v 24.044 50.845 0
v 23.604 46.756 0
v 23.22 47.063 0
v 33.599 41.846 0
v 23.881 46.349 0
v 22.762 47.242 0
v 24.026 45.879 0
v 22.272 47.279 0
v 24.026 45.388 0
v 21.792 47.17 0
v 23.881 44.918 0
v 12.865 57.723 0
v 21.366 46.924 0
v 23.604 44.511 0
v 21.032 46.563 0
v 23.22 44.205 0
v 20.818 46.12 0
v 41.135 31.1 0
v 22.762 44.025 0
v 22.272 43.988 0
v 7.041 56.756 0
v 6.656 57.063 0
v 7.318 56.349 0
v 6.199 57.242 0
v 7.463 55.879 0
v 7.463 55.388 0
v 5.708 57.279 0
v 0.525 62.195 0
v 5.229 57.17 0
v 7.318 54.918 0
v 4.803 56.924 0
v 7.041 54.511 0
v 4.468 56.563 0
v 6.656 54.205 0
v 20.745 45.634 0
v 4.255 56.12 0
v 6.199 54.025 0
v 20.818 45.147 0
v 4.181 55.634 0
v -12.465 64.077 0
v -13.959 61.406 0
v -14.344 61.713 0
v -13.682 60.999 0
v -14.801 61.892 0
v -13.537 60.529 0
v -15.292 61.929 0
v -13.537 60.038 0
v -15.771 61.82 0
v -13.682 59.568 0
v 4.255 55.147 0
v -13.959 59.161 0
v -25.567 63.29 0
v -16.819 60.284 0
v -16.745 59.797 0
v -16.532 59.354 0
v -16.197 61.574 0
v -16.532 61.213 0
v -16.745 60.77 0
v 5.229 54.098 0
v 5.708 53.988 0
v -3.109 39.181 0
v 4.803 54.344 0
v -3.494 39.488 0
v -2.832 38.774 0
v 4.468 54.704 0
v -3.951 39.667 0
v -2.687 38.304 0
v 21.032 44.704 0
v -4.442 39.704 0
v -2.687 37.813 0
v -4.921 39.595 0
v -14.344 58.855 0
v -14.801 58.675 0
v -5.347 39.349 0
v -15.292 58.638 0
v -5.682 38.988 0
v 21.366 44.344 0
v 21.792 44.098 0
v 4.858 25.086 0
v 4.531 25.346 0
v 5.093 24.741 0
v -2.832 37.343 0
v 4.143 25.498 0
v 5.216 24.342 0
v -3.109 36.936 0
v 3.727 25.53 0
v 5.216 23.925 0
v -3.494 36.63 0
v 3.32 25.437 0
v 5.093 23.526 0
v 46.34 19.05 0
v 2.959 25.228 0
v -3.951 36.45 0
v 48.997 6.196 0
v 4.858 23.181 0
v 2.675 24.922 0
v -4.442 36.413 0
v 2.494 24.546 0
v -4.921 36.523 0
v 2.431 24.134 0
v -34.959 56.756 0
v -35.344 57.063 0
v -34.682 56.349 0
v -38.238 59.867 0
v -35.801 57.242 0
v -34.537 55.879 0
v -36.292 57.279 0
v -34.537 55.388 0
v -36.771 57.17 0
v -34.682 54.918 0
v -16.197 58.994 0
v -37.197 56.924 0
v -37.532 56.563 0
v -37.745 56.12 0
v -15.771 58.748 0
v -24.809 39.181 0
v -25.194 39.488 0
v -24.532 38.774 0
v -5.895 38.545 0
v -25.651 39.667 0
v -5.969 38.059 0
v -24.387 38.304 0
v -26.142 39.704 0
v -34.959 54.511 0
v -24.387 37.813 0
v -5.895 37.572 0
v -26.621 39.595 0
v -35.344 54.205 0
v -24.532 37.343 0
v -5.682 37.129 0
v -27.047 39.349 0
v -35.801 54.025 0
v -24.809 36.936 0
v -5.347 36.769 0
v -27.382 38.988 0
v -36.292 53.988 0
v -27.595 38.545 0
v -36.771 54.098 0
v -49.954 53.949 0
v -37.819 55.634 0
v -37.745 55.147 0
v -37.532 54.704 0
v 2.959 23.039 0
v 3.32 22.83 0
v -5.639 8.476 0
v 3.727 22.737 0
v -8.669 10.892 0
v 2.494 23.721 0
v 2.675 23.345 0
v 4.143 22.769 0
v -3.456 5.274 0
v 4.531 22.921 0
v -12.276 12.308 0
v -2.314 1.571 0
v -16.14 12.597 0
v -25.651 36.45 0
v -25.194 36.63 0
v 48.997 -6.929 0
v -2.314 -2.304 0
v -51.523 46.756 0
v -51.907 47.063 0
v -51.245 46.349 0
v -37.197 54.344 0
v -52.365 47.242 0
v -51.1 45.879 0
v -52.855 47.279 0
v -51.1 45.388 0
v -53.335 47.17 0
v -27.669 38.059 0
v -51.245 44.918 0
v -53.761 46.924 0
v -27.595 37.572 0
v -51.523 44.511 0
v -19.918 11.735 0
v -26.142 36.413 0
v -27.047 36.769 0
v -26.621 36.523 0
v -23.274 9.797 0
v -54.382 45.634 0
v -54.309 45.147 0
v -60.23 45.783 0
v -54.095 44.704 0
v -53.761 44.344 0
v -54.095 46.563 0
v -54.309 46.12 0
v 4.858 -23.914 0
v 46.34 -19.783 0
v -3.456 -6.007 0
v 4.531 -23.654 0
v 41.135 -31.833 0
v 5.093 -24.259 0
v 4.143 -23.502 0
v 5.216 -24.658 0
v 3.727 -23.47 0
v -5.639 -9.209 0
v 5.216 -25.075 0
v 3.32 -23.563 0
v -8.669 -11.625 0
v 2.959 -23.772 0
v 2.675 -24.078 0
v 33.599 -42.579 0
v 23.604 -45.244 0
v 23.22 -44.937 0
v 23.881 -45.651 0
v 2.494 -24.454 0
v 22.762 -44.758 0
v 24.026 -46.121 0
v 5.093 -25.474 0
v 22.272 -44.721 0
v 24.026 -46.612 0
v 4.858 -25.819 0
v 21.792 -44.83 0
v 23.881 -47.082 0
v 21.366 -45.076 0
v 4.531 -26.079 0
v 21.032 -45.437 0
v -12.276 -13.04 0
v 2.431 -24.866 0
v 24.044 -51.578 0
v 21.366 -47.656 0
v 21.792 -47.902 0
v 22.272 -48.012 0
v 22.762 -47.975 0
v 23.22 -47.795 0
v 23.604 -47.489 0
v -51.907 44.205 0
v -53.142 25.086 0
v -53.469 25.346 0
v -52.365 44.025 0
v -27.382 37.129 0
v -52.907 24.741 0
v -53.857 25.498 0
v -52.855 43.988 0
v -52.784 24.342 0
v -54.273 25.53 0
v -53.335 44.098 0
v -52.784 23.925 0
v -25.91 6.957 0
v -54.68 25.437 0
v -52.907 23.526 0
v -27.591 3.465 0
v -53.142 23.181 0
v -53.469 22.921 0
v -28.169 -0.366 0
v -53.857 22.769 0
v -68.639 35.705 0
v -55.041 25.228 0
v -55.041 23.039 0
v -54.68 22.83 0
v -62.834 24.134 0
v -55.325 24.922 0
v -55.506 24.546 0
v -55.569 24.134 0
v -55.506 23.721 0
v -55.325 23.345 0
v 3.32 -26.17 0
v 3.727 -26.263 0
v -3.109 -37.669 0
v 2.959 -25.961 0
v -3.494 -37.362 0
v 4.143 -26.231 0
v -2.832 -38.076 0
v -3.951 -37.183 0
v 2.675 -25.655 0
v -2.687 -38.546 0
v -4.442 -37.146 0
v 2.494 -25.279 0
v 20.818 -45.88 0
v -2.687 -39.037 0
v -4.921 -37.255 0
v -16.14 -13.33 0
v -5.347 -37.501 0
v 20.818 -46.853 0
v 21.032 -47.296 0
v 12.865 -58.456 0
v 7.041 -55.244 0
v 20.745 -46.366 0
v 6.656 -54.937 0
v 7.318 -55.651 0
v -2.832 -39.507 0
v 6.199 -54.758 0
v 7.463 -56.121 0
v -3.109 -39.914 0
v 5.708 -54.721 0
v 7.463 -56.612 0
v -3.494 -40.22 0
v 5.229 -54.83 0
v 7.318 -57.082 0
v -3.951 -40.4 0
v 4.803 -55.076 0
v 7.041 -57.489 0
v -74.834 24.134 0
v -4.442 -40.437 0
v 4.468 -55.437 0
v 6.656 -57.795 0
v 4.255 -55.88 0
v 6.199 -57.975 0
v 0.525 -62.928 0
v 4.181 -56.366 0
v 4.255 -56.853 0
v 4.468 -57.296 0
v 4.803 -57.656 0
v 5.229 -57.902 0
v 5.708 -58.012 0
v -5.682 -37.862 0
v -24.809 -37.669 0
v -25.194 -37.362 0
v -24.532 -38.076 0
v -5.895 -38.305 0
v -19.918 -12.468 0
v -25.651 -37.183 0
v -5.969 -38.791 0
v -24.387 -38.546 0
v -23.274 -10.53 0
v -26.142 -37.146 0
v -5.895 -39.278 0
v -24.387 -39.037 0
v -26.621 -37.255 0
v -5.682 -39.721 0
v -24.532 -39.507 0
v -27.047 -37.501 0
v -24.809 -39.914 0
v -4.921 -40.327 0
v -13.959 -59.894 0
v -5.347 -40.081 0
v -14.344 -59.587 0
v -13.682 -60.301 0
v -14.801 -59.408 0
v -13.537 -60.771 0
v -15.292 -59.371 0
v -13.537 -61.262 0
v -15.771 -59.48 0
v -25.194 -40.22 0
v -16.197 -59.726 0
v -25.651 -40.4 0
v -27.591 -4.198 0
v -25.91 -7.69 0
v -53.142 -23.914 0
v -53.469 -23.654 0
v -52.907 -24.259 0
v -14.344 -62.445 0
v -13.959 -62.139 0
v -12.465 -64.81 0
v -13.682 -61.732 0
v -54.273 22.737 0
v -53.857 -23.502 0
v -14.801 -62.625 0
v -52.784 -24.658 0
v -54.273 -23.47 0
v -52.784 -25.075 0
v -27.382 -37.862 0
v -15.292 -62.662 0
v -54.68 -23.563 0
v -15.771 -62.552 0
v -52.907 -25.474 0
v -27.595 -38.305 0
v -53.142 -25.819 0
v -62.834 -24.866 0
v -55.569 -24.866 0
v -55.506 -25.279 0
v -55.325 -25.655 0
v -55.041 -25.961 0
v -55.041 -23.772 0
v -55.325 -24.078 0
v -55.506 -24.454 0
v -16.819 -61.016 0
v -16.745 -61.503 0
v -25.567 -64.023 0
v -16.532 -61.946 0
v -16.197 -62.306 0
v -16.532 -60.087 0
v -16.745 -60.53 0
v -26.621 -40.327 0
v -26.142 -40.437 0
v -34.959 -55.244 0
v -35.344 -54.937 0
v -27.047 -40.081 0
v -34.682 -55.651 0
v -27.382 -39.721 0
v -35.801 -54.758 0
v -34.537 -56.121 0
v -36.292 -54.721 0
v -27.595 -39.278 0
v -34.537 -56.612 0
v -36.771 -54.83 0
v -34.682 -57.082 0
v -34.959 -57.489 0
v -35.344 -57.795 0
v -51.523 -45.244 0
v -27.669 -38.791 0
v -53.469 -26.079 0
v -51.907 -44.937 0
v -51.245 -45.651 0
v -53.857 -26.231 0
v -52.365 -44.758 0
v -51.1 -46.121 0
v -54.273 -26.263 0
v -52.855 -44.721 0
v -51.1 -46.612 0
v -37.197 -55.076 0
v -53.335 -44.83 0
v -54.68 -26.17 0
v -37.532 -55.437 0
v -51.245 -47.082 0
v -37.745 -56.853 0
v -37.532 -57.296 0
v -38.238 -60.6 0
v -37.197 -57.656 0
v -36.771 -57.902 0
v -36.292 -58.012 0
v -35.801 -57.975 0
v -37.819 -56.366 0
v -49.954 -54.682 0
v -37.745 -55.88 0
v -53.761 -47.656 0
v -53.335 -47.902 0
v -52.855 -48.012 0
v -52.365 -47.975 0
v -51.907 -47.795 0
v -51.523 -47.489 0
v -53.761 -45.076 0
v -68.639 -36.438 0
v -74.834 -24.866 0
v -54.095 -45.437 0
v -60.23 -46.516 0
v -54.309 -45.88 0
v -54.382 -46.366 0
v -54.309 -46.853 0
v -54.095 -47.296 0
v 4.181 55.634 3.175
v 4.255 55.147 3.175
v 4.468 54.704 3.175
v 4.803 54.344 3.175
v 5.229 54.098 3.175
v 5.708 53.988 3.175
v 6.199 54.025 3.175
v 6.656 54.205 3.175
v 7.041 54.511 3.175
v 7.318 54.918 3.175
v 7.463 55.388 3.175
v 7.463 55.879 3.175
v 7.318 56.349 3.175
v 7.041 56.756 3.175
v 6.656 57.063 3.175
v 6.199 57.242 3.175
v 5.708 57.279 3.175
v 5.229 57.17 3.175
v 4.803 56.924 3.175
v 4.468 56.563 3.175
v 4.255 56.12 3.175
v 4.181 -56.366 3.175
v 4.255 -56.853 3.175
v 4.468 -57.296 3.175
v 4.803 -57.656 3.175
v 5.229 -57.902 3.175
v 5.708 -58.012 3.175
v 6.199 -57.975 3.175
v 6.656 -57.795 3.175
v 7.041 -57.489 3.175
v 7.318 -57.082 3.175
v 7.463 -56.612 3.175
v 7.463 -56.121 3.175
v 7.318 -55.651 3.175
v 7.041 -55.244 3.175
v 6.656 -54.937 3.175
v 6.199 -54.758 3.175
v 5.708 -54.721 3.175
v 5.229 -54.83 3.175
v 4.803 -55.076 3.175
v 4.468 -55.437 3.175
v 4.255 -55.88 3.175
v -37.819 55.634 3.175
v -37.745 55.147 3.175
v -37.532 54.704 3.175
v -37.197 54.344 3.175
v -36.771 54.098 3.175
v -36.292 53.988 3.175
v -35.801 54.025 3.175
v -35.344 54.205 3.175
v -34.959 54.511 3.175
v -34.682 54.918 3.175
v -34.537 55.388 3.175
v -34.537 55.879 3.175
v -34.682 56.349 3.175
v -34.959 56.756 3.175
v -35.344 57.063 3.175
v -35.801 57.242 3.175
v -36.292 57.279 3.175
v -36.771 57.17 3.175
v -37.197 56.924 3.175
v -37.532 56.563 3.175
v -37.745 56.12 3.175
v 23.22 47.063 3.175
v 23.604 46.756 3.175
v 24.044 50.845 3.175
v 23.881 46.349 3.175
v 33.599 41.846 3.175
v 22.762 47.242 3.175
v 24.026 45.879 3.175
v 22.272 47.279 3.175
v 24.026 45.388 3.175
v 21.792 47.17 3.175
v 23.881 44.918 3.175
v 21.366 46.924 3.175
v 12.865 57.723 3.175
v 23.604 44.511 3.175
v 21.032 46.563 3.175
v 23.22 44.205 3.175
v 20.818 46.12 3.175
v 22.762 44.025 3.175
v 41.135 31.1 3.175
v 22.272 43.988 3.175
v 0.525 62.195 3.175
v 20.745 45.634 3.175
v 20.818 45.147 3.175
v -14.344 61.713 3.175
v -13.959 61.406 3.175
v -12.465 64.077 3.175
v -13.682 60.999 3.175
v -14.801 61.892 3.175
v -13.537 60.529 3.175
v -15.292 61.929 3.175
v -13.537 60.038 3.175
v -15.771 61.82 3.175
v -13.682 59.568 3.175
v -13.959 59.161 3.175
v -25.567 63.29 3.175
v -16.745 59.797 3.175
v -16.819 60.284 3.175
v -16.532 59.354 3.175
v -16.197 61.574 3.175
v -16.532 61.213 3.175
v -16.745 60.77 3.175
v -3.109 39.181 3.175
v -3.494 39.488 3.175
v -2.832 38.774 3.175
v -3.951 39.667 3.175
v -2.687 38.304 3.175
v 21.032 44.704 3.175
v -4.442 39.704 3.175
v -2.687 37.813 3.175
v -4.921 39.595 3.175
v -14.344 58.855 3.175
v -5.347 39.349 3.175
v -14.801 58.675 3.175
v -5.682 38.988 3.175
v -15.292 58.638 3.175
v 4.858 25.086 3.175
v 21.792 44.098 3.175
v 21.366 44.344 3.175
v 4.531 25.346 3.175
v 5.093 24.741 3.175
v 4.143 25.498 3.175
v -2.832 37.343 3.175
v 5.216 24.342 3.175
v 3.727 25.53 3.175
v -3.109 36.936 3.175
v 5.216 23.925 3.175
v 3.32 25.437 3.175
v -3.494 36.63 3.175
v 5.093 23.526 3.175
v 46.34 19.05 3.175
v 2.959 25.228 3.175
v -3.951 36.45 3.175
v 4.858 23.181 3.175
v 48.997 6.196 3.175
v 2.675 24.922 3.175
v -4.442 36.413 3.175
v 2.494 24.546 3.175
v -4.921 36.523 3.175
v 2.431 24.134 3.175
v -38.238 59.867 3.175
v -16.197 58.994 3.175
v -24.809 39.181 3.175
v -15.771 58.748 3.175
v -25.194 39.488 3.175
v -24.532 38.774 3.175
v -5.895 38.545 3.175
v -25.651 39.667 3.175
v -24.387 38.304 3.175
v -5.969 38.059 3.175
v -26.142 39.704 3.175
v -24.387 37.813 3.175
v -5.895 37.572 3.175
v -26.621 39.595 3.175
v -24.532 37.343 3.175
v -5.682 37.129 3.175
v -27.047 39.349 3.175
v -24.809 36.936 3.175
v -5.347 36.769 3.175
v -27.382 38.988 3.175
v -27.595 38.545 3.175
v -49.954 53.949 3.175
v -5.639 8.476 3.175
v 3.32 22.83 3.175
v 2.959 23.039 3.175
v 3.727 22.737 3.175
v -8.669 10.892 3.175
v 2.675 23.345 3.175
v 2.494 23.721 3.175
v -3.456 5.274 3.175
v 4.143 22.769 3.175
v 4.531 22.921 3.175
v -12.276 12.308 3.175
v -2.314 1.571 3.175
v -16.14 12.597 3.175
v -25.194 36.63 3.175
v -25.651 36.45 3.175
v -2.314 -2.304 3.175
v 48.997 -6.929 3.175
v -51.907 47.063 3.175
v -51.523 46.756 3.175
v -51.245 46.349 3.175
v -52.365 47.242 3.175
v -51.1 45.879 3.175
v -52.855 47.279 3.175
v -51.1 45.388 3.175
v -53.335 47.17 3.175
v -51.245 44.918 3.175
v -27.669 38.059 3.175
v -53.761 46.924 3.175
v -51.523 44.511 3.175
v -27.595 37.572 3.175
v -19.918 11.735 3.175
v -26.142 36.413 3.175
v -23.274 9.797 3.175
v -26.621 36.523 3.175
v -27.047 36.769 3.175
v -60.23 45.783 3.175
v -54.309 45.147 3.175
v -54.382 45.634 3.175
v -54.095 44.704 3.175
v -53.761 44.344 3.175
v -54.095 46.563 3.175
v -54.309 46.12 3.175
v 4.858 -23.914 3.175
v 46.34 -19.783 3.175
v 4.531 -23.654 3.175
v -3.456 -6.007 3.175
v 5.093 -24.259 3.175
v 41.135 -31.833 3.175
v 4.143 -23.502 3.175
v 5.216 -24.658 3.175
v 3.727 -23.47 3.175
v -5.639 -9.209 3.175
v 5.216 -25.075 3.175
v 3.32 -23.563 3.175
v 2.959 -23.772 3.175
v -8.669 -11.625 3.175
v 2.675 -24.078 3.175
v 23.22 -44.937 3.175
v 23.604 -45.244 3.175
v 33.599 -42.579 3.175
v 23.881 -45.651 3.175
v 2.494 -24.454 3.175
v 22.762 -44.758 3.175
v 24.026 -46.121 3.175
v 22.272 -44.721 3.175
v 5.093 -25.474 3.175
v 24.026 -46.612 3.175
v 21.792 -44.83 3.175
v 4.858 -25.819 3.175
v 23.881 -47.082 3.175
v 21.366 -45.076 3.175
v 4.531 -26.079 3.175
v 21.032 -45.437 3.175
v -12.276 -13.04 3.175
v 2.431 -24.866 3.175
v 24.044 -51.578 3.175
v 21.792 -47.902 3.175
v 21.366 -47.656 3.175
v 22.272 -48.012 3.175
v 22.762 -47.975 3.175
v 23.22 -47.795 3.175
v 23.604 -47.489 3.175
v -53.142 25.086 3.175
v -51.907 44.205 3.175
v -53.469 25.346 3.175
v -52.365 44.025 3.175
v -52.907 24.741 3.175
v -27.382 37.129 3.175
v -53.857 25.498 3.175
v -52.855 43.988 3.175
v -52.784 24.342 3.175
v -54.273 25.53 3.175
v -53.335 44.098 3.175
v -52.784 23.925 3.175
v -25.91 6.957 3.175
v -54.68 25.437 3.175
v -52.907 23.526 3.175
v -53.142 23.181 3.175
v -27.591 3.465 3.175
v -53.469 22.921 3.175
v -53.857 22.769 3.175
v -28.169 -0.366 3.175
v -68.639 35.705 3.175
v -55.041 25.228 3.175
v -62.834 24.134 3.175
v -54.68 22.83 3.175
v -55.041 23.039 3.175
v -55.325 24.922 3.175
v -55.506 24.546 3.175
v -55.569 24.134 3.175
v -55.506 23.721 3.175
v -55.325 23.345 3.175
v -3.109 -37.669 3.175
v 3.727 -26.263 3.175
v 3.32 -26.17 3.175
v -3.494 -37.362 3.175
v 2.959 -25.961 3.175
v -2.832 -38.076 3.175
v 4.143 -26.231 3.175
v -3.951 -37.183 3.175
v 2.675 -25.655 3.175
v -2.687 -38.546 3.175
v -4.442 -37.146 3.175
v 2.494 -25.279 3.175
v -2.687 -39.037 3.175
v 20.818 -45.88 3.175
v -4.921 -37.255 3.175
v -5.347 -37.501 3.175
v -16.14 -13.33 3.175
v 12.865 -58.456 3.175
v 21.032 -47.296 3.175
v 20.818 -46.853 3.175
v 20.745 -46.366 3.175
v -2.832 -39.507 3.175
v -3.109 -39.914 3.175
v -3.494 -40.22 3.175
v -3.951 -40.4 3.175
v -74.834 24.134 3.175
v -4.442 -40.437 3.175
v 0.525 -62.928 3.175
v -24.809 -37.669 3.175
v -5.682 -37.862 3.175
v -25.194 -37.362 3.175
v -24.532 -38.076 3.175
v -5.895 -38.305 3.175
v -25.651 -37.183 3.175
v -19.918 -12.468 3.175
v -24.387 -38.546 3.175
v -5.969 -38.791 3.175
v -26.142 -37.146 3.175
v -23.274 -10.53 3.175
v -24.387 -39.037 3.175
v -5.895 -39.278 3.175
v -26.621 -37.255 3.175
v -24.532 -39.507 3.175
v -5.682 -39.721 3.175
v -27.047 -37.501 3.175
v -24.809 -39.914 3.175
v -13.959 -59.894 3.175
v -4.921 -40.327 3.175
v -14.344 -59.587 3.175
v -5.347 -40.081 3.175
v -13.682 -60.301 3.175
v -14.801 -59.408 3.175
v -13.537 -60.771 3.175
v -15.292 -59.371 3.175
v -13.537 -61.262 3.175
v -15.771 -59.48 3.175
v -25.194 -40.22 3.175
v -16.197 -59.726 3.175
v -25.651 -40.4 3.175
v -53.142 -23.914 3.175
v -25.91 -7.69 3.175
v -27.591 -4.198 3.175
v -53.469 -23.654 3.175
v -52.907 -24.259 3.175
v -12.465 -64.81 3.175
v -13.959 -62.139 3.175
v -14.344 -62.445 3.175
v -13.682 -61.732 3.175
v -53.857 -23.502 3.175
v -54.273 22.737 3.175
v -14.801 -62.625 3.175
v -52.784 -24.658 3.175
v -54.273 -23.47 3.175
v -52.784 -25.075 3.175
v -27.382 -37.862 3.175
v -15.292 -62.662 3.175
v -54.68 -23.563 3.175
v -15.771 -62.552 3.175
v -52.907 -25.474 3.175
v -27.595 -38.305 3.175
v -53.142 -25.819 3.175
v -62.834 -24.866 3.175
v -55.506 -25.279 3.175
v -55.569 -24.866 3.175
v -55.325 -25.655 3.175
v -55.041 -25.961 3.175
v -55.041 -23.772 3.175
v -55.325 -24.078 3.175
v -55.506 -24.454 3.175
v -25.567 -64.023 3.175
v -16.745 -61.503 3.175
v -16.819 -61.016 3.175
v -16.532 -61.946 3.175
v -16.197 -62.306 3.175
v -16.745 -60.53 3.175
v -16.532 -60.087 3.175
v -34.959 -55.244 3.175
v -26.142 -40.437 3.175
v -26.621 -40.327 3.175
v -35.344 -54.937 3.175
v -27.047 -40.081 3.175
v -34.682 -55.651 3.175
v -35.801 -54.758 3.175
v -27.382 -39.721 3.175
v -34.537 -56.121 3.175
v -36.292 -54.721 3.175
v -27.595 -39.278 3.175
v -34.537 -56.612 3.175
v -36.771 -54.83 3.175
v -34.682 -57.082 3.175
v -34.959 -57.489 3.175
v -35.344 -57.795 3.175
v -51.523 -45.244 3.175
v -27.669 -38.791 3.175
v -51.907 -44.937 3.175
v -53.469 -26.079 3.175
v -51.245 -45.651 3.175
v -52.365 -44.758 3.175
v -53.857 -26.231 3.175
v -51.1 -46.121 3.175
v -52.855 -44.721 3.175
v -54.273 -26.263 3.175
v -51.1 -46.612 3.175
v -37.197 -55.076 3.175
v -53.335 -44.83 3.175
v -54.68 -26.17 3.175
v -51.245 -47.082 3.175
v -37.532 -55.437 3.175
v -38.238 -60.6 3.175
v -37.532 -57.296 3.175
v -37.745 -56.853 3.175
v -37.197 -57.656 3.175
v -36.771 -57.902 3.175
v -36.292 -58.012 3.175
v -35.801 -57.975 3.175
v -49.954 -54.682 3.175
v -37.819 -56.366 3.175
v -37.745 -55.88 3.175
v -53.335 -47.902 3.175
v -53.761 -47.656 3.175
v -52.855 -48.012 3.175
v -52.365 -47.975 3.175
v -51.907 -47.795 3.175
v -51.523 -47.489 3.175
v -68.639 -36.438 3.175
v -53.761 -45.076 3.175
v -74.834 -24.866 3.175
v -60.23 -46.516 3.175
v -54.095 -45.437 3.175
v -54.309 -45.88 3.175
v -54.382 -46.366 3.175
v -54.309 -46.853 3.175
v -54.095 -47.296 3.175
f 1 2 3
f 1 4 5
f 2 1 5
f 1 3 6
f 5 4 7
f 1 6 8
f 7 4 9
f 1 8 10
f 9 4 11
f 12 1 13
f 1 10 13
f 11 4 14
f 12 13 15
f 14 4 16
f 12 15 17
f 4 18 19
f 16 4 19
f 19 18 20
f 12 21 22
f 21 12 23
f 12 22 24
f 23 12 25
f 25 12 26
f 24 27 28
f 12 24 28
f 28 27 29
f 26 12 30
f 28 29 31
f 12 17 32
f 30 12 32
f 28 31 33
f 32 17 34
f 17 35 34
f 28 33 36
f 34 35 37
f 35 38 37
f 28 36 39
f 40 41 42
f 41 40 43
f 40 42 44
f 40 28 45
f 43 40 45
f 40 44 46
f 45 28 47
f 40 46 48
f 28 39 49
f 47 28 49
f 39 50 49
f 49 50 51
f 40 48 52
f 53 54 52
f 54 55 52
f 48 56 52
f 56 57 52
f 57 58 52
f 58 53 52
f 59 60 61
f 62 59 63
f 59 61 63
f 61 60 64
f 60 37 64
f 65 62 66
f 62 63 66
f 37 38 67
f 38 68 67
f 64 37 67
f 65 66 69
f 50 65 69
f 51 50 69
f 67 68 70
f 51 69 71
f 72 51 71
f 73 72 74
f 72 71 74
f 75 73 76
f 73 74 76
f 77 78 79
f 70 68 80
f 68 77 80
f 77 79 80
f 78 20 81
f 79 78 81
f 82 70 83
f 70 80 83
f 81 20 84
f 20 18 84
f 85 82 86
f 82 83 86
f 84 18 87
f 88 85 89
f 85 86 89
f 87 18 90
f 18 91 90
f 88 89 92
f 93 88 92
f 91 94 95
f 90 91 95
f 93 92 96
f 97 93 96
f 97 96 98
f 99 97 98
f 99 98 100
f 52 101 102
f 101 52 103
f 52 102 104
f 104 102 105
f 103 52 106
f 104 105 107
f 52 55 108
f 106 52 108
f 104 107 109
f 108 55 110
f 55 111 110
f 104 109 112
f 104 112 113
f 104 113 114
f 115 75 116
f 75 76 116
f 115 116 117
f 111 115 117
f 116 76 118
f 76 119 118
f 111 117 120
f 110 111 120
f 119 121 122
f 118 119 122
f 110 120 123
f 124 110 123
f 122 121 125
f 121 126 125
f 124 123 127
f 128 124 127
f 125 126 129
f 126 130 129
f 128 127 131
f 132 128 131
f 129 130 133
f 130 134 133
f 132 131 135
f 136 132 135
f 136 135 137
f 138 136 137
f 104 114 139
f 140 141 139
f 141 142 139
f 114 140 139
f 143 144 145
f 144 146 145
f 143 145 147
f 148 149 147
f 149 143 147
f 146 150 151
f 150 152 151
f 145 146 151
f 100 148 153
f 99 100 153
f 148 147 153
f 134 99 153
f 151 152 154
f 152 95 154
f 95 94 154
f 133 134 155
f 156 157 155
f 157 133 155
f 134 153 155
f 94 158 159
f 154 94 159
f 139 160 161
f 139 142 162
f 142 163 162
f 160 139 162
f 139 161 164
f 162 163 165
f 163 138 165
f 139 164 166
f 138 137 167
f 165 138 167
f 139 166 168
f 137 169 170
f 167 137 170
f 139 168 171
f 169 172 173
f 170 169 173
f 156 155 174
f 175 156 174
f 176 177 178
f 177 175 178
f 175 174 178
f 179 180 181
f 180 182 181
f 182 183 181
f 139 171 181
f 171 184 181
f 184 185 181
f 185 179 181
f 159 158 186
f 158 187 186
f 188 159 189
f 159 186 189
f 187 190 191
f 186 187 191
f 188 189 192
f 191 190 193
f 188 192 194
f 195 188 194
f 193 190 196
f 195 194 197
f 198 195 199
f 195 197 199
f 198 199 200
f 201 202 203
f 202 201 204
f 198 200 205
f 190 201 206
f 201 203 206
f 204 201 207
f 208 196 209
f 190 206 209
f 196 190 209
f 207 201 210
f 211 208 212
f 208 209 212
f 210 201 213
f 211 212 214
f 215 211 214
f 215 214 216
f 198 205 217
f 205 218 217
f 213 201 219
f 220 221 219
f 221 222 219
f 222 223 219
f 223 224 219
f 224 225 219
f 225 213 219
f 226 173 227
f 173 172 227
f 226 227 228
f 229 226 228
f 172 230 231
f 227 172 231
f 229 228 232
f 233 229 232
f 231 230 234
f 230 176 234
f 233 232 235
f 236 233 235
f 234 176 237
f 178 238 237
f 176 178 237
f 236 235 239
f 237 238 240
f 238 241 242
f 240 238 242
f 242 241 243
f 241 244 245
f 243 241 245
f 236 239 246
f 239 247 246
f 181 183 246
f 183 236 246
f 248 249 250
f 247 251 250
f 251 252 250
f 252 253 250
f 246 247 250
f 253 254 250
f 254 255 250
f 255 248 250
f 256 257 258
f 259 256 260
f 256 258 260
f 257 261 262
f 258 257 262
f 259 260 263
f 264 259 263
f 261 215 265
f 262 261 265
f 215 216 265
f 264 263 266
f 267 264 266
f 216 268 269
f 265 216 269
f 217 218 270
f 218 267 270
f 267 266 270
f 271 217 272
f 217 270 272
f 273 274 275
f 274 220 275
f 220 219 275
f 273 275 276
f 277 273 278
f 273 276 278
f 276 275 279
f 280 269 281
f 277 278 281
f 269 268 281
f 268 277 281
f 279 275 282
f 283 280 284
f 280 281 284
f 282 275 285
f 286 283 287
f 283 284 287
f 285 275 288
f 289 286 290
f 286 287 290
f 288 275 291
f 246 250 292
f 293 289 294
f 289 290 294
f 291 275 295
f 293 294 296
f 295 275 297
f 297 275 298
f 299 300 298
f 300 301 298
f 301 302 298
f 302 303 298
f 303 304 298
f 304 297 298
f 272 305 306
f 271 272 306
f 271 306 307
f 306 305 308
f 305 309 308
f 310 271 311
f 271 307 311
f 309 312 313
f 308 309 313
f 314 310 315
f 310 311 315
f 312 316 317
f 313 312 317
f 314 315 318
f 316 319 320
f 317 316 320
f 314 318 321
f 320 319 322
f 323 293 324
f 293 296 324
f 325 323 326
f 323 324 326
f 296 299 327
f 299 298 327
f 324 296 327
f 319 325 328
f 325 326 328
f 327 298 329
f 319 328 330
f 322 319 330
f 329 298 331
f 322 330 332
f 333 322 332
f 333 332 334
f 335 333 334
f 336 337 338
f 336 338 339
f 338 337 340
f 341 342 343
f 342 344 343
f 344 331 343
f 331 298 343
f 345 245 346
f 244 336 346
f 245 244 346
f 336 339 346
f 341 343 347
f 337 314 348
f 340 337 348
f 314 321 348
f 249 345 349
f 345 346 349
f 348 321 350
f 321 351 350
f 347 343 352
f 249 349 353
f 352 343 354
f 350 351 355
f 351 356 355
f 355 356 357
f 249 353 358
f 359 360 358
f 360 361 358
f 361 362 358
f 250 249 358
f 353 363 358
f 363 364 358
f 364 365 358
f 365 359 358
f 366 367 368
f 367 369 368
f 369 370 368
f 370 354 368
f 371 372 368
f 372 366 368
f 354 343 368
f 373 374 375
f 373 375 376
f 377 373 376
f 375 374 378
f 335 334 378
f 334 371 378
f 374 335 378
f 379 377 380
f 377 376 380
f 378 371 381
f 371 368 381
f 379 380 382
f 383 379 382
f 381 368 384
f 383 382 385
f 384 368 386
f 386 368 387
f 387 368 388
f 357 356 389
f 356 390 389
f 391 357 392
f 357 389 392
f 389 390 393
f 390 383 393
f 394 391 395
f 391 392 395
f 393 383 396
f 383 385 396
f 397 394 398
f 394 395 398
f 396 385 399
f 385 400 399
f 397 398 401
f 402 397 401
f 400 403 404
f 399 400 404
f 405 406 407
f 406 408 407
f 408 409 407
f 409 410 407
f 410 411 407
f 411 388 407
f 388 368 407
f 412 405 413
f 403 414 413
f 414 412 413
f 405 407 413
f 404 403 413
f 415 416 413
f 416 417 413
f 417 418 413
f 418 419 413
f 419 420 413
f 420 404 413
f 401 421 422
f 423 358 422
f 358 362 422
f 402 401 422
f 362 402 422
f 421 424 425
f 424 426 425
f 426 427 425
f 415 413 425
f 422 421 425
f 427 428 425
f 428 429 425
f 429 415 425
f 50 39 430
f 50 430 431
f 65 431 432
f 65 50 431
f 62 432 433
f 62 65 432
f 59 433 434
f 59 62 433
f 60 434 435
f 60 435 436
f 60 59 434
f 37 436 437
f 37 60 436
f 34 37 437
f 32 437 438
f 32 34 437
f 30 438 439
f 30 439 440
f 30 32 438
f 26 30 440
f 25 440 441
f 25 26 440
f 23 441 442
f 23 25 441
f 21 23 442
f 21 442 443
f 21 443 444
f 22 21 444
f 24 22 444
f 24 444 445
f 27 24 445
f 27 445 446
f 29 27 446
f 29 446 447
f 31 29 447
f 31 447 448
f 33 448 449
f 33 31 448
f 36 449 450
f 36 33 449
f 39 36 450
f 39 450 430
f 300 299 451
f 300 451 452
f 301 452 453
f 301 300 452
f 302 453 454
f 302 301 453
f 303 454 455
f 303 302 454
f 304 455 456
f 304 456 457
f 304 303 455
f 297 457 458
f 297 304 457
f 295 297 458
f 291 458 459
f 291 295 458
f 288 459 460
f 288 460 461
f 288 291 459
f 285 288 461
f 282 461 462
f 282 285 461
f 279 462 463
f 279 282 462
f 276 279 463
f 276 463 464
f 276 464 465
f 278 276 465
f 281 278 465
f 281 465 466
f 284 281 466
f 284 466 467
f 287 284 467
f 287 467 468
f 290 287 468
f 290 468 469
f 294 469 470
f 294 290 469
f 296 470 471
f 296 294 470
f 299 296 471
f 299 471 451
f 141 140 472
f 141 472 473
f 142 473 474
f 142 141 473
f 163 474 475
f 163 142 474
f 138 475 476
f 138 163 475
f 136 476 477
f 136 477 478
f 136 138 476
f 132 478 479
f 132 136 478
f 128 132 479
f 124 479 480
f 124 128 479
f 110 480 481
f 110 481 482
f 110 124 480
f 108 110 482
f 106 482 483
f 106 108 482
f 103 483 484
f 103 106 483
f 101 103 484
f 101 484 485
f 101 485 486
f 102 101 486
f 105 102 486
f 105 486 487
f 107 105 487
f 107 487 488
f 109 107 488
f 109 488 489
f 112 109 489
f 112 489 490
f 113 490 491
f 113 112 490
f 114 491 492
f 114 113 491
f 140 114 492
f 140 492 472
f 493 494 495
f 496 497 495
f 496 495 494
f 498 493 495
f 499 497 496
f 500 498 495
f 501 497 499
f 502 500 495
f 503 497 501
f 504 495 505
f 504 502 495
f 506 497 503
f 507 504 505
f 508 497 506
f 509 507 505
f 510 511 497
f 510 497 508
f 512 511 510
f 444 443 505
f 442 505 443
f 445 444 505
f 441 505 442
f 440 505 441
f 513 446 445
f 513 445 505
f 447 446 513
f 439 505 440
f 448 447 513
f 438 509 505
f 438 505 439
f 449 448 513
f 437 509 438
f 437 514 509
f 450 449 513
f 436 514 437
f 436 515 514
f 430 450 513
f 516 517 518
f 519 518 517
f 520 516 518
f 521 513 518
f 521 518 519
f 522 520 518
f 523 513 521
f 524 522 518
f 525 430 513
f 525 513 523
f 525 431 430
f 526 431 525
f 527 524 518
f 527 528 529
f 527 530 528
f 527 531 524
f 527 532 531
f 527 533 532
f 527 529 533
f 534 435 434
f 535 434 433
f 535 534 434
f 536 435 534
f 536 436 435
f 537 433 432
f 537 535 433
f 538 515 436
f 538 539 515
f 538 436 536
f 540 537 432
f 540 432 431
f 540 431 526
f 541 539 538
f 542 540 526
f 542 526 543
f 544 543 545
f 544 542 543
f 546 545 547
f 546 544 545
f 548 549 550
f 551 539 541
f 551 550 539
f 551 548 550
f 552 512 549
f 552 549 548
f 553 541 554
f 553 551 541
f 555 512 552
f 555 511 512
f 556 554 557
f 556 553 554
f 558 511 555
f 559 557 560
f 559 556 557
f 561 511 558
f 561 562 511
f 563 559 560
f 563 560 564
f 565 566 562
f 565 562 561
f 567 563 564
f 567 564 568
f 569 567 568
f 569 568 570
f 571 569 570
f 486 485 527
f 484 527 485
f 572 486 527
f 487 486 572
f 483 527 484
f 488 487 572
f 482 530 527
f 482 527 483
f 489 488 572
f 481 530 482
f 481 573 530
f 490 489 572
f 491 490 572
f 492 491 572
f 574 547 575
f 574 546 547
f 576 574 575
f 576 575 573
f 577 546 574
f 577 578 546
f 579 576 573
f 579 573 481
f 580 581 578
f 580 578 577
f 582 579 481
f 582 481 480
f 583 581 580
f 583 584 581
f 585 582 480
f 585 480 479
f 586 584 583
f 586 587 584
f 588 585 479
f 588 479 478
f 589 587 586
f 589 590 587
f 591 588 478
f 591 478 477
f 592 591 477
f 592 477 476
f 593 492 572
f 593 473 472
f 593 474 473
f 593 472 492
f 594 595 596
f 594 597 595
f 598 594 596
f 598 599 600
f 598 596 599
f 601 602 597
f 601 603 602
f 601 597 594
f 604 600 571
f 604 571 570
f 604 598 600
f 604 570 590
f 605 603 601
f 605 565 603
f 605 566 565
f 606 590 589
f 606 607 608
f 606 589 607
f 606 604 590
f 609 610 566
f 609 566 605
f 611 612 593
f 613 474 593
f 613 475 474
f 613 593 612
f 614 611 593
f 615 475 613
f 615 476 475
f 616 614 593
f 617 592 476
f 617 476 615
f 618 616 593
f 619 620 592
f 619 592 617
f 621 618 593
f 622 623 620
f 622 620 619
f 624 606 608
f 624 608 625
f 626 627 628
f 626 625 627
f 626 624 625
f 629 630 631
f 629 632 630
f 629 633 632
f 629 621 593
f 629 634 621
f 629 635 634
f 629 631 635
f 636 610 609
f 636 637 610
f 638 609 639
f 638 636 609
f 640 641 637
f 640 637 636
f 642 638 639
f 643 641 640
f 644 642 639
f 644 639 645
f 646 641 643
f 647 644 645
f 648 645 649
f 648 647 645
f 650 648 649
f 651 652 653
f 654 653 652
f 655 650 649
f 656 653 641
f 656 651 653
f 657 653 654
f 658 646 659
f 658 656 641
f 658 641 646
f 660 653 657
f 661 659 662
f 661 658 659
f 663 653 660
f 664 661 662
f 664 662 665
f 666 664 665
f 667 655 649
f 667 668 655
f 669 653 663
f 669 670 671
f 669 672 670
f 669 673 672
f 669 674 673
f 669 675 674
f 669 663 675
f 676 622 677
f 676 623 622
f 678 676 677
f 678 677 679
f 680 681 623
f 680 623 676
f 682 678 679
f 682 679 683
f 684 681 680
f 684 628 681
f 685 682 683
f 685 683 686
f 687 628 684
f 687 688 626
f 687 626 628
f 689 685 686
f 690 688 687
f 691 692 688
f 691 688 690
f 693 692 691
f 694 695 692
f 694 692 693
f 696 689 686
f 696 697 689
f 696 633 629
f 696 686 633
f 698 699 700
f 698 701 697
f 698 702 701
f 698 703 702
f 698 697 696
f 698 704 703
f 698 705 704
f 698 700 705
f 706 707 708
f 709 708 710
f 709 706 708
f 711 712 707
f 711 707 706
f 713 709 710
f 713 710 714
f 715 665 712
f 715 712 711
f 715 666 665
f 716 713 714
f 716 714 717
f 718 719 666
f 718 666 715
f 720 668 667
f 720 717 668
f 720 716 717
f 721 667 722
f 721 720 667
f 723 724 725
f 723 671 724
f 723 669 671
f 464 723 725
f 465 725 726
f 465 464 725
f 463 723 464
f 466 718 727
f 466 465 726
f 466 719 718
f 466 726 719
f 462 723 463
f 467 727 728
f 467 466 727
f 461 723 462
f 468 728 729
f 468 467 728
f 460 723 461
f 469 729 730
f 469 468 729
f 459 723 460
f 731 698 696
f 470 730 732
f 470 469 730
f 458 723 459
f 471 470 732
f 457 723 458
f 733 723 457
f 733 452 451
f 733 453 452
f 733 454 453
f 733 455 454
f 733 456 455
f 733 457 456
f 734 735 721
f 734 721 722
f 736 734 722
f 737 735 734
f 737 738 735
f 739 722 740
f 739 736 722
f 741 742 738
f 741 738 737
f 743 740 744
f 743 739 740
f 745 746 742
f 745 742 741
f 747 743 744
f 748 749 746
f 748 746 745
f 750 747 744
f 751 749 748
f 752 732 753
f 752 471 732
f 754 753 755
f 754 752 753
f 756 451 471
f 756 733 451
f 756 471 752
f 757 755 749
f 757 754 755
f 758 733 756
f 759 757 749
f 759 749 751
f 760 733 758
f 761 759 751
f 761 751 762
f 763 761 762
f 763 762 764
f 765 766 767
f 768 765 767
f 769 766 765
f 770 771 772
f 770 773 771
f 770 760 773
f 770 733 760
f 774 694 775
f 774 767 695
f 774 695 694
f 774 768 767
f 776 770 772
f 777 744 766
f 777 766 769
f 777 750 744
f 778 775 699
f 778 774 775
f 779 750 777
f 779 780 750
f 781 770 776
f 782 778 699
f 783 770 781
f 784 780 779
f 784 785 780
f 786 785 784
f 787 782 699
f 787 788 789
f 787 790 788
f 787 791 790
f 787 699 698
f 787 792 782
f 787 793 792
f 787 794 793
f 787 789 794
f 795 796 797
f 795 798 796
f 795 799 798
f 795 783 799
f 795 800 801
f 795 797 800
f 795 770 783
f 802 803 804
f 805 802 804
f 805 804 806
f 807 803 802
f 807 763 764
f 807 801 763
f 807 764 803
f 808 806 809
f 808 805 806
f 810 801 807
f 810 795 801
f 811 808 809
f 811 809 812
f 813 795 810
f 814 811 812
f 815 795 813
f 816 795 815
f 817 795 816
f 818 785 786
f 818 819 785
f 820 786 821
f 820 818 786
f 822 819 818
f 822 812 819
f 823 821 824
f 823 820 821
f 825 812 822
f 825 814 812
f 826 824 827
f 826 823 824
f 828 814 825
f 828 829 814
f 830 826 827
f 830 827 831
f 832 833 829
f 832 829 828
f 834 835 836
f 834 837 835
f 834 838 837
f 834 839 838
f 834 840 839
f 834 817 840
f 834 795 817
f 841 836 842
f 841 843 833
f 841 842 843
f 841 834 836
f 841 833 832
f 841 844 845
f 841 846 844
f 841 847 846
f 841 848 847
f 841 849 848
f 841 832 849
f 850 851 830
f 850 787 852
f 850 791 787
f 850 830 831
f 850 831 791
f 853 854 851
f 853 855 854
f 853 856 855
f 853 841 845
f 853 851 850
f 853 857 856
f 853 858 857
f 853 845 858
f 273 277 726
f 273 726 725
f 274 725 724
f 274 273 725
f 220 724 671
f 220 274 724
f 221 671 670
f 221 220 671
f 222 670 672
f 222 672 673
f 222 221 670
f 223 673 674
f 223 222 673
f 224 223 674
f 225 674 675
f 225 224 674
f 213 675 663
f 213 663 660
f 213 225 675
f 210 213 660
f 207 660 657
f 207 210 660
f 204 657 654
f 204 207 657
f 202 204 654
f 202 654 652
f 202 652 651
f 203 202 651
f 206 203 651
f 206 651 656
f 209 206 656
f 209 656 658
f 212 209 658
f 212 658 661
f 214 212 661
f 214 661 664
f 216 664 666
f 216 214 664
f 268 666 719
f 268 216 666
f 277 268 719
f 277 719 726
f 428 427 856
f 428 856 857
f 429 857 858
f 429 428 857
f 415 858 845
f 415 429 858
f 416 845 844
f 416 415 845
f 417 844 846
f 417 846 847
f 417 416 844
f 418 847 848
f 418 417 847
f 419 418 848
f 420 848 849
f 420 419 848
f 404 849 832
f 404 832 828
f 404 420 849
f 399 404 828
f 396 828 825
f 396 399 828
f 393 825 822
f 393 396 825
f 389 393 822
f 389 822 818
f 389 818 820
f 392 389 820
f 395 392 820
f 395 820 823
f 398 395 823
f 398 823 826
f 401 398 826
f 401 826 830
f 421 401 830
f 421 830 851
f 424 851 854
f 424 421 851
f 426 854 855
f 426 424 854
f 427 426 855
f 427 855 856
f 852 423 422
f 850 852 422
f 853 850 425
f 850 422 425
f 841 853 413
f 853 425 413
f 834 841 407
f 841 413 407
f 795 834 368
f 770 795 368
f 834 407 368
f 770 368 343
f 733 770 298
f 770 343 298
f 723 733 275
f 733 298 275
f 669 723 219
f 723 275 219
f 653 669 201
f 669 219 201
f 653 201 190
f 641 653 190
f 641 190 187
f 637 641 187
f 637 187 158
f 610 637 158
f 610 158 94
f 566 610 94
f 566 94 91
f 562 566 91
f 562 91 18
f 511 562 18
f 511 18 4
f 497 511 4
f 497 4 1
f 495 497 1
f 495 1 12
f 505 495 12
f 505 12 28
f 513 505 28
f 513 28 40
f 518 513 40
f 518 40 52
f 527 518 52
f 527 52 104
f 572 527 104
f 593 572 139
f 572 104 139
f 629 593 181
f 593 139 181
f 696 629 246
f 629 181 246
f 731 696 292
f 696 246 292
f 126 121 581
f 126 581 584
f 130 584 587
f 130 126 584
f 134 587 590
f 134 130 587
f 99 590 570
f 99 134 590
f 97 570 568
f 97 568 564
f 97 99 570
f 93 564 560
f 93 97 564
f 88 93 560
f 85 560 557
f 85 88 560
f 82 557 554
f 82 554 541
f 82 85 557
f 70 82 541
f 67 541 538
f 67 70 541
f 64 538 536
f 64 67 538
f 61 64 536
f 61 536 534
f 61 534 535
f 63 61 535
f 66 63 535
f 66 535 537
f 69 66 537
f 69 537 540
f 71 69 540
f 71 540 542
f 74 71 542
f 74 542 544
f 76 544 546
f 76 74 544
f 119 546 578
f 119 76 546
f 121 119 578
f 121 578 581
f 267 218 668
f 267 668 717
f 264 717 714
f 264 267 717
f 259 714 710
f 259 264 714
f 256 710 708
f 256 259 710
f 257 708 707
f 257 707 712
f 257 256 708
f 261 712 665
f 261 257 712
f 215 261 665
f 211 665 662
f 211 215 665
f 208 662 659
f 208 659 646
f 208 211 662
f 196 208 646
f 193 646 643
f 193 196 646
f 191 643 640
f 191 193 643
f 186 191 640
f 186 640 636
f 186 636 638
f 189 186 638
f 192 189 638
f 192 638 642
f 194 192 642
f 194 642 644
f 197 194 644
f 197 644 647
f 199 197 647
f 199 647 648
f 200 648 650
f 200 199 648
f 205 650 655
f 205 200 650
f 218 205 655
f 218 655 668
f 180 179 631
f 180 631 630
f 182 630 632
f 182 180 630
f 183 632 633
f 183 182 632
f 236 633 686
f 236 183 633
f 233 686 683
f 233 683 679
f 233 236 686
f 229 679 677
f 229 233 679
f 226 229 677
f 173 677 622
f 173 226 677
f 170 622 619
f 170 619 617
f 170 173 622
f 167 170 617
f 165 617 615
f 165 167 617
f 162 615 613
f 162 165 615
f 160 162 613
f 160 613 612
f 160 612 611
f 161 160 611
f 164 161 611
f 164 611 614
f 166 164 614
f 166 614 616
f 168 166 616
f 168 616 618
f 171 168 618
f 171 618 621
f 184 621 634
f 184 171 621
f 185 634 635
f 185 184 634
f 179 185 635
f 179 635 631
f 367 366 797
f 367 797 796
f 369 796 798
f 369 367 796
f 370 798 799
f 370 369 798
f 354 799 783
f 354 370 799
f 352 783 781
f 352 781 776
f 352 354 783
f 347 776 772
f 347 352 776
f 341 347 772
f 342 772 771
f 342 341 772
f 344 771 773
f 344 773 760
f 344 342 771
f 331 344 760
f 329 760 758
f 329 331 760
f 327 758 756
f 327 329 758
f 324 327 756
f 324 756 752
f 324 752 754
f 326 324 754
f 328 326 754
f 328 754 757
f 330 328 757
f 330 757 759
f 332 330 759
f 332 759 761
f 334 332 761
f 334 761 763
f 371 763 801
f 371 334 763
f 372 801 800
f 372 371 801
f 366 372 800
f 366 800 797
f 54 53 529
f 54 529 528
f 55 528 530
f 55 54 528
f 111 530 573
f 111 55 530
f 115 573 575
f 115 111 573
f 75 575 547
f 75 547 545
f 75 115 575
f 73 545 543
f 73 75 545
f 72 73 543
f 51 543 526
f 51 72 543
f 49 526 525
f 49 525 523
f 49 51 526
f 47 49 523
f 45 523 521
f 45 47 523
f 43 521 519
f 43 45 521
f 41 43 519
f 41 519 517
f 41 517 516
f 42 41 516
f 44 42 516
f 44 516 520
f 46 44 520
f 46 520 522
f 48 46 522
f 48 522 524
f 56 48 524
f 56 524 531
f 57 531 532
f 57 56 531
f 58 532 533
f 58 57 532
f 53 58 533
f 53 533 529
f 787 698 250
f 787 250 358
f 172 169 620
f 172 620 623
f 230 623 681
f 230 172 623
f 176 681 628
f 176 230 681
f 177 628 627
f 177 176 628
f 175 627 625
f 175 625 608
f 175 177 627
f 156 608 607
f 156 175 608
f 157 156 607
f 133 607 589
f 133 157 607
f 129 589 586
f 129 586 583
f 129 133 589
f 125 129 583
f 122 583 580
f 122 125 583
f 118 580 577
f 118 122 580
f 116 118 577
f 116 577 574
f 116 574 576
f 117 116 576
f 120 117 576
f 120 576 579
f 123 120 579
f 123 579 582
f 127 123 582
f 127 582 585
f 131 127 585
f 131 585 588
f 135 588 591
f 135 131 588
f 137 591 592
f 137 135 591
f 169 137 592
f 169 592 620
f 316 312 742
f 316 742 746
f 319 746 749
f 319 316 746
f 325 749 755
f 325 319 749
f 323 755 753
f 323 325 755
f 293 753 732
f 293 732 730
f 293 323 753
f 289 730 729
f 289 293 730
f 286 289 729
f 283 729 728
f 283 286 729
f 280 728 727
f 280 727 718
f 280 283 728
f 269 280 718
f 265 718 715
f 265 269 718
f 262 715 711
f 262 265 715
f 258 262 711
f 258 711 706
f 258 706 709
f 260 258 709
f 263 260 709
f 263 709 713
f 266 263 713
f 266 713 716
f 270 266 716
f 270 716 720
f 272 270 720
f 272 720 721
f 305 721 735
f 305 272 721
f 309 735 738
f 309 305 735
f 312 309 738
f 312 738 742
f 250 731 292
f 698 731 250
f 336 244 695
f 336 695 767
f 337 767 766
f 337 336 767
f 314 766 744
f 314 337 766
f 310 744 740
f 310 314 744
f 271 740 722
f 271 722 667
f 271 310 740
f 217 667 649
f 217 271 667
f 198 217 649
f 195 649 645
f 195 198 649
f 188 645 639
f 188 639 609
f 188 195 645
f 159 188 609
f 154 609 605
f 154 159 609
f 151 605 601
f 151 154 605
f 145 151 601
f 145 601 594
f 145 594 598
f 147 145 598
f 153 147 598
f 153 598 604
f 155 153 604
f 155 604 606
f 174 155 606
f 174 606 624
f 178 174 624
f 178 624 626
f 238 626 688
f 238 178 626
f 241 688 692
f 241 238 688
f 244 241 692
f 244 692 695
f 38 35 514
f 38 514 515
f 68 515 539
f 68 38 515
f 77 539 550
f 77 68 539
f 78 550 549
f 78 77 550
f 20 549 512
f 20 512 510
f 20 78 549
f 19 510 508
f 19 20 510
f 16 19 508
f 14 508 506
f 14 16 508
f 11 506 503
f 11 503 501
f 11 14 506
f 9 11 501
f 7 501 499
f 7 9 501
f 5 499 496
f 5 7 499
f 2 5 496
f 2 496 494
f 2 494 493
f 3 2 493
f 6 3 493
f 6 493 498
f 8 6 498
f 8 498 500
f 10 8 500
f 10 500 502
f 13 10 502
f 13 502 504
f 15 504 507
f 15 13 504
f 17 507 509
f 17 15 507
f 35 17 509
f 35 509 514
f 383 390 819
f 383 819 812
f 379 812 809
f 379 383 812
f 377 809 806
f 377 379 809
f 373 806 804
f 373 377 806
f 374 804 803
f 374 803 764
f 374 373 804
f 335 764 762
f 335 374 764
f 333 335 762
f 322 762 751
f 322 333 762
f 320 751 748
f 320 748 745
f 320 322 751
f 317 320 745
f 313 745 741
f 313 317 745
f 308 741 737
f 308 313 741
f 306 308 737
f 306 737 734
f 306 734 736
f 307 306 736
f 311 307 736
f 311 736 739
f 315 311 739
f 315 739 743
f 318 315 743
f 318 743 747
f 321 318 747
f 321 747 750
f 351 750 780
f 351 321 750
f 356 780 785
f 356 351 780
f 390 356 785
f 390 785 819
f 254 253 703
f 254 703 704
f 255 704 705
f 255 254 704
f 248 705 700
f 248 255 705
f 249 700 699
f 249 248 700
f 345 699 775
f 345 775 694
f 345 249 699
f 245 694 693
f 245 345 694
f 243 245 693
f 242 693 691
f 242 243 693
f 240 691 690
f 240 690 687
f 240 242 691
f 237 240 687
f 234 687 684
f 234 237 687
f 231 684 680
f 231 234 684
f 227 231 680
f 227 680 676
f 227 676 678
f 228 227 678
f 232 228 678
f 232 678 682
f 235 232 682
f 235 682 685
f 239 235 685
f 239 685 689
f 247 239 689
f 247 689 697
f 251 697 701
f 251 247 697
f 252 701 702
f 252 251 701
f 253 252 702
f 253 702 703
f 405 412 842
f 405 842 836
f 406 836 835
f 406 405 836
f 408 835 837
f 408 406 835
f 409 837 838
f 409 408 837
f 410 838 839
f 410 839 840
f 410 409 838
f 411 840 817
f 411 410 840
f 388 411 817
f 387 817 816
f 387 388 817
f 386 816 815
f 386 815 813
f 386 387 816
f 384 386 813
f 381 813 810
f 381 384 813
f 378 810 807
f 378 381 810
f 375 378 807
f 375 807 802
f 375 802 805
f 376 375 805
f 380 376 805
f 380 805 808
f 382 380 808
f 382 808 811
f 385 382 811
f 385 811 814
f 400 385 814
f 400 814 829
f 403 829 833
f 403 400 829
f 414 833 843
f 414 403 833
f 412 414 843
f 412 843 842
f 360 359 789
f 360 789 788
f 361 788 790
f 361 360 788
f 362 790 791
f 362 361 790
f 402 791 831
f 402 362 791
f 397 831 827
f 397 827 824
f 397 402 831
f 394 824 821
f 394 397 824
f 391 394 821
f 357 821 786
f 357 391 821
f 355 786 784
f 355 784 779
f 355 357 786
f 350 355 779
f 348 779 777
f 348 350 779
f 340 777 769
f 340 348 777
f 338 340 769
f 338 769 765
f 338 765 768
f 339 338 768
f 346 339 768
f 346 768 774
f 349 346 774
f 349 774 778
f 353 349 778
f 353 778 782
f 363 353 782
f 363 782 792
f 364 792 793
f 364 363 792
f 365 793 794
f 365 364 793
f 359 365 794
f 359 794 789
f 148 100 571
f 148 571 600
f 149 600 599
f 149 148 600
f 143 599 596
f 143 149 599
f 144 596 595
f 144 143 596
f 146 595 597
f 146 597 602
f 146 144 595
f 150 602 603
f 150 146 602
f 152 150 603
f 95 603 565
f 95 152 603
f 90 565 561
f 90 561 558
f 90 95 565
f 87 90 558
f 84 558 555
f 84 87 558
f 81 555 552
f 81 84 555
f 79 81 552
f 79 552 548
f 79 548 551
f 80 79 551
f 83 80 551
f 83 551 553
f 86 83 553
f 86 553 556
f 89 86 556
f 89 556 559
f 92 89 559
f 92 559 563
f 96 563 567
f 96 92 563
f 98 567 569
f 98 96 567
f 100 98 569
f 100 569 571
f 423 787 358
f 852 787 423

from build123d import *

# Parameters (mm, degrees)
SKETCH1_R           = 64.5
SKETCH1_R_2         = 1.65
SKETCH1_R_3         = 13
SKETCH1_R_4         = 1.4
BOSS_EXTRUDE2_DEPTH = 3.175
CUT_EXTRUDE1_DEPTH  = 3.175


with BuildPart() as part:
    # Sketch1 → Boss-Extrude2 (new body)
    with BuildSketch(Plane(origin=(0, 0, 0), x_dir=(-1, 0, 0), z_dir=(0, 0, 1))):
        with Locations((15.168596538, 0.366425758)):
            Circle(SKETCH1_R)
        with Locations((15.168596538, -60.283574242)):
            Circle(SKETCH1_R_2, mode=Mode.SUBTRACT)
        with Locations((15.168596538, 61.016425758)):
            Circle(SKETCH1_R_2, mode=Mode.SUBTRACT)
        with Locations((26.018596538, -38.058574242)):
            Circle(SKETCH1_R_2, mode=Mode.SUBTRACT)
        with Locations((4.318596538, -38.058574242)):
            Circle(SKETCH1_R_2, mode=Mode.SUBTRACT)
        with Locations((26.018596538, 38.791425758)):
            Circle(SKETCH1_R_2, mode=Mode.SUBTRACT)
        with Locations((4.318596538, 38.791425758)):
            Circle(SKETCH1_R_2, mode=Mode.SUBTRACT)
        with Locations((15.168596538, 0.366425758)):
            Circle(SKETCH1_R_3, mode=Mode.SUBTRACT)
        with Locations((54.168596538, -24.133574242)):
            Circle(SKETCH1_R_4, mode=Mode.SUBTRACT)
        with Locations((54.168596538, 24.866425758)):
            Circle(SKETCH1_R_4, mode=Mode.SUBTRACT)
        with Locations((-3.831403462, -24.133574242)):
            Circle(SKETCH1_R_4, mode=Mode.SUBTRACT)
        with Locations((-3.831403462, 24.866425758)):
            Circle(SKETCH1_R_4, mode=Mode.SUBTRACT)
        with Locations((-5.831403462, 56.366425758)):
            Circle(SKETCH1_R_2, mode=Mode.SUBTRACT)
        with Locations((-22.394874657, 46.366425758)):
            Circle(SKETCH1_R_2, mode=Mode.SUBTRACT)
        with Locations((36.168596538, 56.366425758)):
            Circle(SKETCH1_R_2, mode=Mode.SUBTRACT)
        with Locations((52.732067734, 46.366425758)):
            Circle(SKETCH1_R_2, mode=Mode.SUBTRACT)
        with Locations((52.732067734, -45.633574242)):
            Circle(SKETCH1_R_2, mode=Mode.SUBTRACT)
        with Locations((36.168596538, -55.633574242)):
            Circle(SKETCH1_R_2, mode=Mode.SUBTRACT)
        with Locations((-5.831403462, -55.633574242)):
            Circle(SKETCH1_R_2, mode=Mode.SUBTRACT)
        with Locations((-22.394874657, -45.633574242)):
            Circle(SKETCH1_R_2, mode=Mode.SUBTRACT)
    extrude(amount=BOSS_EXTRUDE2_DEPTH)

    # Sketch2 → Cut-Extrude1 (cut)
    with BuildSketch(Plane.XY.offset(3.175)):
        with BuildLine():
            Line((-74.834332099, 24.133574242), (-62.834332099, 24.133574242))
            Line((-62.834332099, 24.133574242), (-62.834332099, -24.866425758))
            Line((-62.834332099, -24.866425758), (-74.834332099, -24.866425758))
            ThreePointArc((-74.834332099, -24.866425758), (-79.668596538, -0.366425758), (-74.834332099, 24.133574242))
        make_face()
    extrude(amount=-CUT_EXTRUDE1_DEPTH, mode=Mode.SUBTRACT)


solid = part.part
